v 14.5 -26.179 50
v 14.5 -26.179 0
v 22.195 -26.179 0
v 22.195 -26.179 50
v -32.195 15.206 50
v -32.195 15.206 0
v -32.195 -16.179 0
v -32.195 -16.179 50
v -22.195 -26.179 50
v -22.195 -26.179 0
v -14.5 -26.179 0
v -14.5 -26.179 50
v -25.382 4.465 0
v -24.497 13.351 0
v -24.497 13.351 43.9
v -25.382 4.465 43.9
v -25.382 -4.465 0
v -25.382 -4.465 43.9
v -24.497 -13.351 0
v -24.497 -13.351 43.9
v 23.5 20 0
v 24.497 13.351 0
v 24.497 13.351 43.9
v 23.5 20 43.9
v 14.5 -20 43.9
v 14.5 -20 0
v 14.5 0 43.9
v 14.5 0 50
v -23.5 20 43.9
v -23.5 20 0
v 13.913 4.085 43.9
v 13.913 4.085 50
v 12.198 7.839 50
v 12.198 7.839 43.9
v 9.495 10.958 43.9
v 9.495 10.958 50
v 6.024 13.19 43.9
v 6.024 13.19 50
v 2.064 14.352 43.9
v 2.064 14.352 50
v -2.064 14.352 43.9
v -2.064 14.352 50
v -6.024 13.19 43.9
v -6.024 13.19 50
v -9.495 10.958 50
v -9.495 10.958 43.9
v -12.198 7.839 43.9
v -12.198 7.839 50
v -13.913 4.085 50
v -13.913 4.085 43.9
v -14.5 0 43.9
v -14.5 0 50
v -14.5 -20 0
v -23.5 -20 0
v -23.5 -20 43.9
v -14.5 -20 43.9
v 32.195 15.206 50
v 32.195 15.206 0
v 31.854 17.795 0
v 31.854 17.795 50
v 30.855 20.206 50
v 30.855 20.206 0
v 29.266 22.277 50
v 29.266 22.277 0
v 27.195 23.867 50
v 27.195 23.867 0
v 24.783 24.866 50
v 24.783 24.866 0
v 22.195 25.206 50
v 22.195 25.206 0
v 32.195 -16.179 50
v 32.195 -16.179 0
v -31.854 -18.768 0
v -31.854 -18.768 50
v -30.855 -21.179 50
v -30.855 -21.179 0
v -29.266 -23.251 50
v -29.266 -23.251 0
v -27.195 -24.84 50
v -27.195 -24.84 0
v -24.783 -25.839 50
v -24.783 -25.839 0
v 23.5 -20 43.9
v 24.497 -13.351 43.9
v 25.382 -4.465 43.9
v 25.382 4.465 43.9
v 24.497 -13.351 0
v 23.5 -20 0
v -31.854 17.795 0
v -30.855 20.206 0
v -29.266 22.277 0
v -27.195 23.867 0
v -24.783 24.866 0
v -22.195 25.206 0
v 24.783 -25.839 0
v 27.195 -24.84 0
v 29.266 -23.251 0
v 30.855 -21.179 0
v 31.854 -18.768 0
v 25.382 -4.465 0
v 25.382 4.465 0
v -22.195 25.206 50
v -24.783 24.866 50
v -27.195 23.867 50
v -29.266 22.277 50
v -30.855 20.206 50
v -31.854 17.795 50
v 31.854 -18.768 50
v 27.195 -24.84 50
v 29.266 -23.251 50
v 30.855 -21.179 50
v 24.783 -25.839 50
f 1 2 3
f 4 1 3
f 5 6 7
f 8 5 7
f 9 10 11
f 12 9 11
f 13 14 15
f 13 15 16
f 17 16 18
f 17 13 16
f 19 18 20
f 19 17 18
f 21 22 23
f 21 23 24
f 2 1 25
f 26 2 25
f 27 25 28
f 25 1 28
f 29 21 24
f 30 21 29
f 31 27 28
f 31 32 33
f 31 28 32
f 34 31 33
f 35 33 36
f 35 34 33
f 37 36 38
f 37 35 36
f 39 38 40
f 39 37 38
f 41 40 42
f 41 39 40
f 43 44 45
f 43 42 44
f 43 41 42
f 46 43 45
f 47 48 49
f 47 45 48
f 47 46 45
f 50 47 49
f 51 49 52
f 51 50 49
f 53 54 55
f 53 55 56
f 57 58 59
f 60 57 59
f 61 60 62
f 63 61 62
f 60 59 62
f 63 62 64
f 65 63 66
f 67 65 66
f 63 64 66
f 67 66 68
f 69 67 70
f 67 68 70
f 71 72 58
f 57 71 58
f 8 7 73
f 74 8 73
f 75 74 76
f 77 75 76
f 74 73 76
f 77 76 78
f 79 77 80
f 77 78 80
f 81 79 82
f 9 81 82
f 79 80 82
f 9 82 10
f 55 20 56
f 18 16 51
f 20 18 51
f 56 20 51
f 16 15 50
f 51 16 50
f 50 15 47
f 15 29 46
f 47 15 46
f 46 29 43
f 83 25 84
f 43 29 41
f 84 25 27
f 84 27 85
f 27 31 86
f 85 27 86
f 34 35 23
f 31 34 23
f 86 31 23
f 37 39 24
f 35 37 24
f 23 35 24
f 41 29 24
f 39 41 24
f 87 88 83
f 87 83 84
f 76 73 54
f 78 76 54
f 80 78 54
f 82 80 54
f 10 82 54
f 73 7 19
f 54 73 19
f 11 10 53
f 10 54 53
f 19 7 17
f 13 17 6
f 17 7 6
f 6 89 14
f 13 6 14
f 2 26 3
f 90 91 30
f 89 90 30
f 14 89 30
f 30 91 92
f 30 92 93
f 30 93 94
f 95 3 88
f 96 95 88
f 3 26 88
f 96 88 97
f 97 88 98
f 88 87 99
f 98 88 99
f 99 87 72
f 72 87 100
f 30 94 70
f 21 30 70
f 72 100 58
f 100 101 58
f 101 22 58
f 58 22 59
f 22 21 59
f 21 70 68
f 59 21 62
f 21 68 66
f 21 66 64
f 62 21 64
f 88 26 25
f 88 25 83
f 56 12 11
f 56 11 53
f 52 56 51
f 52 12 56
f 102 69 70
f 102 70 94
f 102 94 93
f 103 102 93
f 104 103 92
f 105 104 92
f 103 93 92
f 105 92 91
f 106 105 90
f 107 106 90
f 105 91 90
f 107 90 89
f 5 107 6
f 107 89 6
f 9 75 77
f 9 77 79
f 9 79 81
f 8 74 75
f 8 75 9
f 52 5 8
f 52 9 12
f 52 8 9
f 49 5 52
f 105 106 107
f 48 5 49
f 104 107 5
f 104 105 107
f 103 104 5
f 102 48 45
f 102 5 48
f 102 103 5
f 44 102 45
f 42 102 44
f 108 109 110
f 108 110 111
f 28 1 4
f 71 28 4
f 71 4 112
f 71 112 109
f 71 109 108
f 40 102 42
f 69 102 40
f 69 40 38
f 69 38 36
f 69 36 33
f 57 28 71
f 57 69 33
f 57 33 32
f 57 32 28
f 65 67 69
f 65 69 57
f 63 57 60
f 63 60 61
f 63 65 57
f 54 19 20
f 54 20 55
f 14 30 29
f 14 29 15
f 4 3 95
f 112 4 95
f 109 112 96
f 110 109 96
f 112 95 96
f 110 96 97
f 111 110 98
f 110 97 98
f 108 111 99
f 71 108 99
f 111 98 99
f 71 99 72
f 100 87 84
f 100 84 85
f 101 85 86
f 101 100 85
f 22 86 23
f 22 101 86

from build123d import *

# Parameters (mm, degrees)
F3_DEPTH = 50
F2_R     = 14.5
F4_DEPTH = 75
F5_DEPTH = 43.9
F6_W     = 29
F6_H     = 29
F7_DEPTH = 59.8


with BuildPart() as f3:
    # F1 (on Top) → F3 (new body)
    with BuildSketch(Plane.XY):
        with BuildLine():
            ThreePointArc((32.19508, 15.206385), (29.266148, 22.277453), (22.19508, 25.206385))
            Line((22.19508, 25.206385), (-22.19508, 25.206385))
            ThreePointArc((-22.19508, 25.206385), (-29.266148, 22.277453), (-32.19508, 15.206385))
            Line((-32.19508, 15.206385), (-32.19508, -16.179468))
            ThreePointArc((-32.19508, -16.179468), (-29.266148, -23.250536), (-22.19508, -26.179468))
            Line((-22.19508, -26.179468), (22.19508, -26.179468))
            ThreePointArc((22.19508, -26.179468), (29.266148, -23.250536), (32.19508, -16.179468))
            Line((32.19508, -16.179468), (32.19508, 15.206385))
        make_face()
    extrude(amount=F3_DEPTH)

    # F2 (on Top) → F4 (cut)
    with BuildSketch(Plane.XY):
        Circle(F2_R)
    extrude(amount=F4_DEPTH, mode=Mode.SUBTRACT)

    # F0 (on Top) → F5 (cut)
    with BuildSketch(Plane.XY):
        with BuildLine():
            Line((23.5, 20), (-23.5, 20))
            Line((-23.5, 20), (-24.497404, 13.350641))
            ThreePointArc((-24.497404, 13.350641), (-25.493132, 0), (-24.497404, -13.350641))
            Line((-24.497404, -13.350641), (-23.5, -20))
            Line((-23.5, -20), (23.5, -20))
            Line((23.5, -20), (24.497404, -13.350641))
            ThreePointArc((24.497404, -13.350641), (25.493132, 0), (24.497404, 13.350641))
            Line((24.497404, 13.350641), (23.5, 20))
        make_face()
    extrude(amount=F5_DEPTH, mode=Mode.SUBTRACT)

    # F6 (on face) → F7 (cut)
    with BuildSketch(Plane.XY.offset(50)):
        with Locations((0, -14.5)):
            Rectangle(F6_W, F6_H)
    extrude(amount=-F7_DEPTH, mode=Mode.SUBTRACT)


solid = f3.part
